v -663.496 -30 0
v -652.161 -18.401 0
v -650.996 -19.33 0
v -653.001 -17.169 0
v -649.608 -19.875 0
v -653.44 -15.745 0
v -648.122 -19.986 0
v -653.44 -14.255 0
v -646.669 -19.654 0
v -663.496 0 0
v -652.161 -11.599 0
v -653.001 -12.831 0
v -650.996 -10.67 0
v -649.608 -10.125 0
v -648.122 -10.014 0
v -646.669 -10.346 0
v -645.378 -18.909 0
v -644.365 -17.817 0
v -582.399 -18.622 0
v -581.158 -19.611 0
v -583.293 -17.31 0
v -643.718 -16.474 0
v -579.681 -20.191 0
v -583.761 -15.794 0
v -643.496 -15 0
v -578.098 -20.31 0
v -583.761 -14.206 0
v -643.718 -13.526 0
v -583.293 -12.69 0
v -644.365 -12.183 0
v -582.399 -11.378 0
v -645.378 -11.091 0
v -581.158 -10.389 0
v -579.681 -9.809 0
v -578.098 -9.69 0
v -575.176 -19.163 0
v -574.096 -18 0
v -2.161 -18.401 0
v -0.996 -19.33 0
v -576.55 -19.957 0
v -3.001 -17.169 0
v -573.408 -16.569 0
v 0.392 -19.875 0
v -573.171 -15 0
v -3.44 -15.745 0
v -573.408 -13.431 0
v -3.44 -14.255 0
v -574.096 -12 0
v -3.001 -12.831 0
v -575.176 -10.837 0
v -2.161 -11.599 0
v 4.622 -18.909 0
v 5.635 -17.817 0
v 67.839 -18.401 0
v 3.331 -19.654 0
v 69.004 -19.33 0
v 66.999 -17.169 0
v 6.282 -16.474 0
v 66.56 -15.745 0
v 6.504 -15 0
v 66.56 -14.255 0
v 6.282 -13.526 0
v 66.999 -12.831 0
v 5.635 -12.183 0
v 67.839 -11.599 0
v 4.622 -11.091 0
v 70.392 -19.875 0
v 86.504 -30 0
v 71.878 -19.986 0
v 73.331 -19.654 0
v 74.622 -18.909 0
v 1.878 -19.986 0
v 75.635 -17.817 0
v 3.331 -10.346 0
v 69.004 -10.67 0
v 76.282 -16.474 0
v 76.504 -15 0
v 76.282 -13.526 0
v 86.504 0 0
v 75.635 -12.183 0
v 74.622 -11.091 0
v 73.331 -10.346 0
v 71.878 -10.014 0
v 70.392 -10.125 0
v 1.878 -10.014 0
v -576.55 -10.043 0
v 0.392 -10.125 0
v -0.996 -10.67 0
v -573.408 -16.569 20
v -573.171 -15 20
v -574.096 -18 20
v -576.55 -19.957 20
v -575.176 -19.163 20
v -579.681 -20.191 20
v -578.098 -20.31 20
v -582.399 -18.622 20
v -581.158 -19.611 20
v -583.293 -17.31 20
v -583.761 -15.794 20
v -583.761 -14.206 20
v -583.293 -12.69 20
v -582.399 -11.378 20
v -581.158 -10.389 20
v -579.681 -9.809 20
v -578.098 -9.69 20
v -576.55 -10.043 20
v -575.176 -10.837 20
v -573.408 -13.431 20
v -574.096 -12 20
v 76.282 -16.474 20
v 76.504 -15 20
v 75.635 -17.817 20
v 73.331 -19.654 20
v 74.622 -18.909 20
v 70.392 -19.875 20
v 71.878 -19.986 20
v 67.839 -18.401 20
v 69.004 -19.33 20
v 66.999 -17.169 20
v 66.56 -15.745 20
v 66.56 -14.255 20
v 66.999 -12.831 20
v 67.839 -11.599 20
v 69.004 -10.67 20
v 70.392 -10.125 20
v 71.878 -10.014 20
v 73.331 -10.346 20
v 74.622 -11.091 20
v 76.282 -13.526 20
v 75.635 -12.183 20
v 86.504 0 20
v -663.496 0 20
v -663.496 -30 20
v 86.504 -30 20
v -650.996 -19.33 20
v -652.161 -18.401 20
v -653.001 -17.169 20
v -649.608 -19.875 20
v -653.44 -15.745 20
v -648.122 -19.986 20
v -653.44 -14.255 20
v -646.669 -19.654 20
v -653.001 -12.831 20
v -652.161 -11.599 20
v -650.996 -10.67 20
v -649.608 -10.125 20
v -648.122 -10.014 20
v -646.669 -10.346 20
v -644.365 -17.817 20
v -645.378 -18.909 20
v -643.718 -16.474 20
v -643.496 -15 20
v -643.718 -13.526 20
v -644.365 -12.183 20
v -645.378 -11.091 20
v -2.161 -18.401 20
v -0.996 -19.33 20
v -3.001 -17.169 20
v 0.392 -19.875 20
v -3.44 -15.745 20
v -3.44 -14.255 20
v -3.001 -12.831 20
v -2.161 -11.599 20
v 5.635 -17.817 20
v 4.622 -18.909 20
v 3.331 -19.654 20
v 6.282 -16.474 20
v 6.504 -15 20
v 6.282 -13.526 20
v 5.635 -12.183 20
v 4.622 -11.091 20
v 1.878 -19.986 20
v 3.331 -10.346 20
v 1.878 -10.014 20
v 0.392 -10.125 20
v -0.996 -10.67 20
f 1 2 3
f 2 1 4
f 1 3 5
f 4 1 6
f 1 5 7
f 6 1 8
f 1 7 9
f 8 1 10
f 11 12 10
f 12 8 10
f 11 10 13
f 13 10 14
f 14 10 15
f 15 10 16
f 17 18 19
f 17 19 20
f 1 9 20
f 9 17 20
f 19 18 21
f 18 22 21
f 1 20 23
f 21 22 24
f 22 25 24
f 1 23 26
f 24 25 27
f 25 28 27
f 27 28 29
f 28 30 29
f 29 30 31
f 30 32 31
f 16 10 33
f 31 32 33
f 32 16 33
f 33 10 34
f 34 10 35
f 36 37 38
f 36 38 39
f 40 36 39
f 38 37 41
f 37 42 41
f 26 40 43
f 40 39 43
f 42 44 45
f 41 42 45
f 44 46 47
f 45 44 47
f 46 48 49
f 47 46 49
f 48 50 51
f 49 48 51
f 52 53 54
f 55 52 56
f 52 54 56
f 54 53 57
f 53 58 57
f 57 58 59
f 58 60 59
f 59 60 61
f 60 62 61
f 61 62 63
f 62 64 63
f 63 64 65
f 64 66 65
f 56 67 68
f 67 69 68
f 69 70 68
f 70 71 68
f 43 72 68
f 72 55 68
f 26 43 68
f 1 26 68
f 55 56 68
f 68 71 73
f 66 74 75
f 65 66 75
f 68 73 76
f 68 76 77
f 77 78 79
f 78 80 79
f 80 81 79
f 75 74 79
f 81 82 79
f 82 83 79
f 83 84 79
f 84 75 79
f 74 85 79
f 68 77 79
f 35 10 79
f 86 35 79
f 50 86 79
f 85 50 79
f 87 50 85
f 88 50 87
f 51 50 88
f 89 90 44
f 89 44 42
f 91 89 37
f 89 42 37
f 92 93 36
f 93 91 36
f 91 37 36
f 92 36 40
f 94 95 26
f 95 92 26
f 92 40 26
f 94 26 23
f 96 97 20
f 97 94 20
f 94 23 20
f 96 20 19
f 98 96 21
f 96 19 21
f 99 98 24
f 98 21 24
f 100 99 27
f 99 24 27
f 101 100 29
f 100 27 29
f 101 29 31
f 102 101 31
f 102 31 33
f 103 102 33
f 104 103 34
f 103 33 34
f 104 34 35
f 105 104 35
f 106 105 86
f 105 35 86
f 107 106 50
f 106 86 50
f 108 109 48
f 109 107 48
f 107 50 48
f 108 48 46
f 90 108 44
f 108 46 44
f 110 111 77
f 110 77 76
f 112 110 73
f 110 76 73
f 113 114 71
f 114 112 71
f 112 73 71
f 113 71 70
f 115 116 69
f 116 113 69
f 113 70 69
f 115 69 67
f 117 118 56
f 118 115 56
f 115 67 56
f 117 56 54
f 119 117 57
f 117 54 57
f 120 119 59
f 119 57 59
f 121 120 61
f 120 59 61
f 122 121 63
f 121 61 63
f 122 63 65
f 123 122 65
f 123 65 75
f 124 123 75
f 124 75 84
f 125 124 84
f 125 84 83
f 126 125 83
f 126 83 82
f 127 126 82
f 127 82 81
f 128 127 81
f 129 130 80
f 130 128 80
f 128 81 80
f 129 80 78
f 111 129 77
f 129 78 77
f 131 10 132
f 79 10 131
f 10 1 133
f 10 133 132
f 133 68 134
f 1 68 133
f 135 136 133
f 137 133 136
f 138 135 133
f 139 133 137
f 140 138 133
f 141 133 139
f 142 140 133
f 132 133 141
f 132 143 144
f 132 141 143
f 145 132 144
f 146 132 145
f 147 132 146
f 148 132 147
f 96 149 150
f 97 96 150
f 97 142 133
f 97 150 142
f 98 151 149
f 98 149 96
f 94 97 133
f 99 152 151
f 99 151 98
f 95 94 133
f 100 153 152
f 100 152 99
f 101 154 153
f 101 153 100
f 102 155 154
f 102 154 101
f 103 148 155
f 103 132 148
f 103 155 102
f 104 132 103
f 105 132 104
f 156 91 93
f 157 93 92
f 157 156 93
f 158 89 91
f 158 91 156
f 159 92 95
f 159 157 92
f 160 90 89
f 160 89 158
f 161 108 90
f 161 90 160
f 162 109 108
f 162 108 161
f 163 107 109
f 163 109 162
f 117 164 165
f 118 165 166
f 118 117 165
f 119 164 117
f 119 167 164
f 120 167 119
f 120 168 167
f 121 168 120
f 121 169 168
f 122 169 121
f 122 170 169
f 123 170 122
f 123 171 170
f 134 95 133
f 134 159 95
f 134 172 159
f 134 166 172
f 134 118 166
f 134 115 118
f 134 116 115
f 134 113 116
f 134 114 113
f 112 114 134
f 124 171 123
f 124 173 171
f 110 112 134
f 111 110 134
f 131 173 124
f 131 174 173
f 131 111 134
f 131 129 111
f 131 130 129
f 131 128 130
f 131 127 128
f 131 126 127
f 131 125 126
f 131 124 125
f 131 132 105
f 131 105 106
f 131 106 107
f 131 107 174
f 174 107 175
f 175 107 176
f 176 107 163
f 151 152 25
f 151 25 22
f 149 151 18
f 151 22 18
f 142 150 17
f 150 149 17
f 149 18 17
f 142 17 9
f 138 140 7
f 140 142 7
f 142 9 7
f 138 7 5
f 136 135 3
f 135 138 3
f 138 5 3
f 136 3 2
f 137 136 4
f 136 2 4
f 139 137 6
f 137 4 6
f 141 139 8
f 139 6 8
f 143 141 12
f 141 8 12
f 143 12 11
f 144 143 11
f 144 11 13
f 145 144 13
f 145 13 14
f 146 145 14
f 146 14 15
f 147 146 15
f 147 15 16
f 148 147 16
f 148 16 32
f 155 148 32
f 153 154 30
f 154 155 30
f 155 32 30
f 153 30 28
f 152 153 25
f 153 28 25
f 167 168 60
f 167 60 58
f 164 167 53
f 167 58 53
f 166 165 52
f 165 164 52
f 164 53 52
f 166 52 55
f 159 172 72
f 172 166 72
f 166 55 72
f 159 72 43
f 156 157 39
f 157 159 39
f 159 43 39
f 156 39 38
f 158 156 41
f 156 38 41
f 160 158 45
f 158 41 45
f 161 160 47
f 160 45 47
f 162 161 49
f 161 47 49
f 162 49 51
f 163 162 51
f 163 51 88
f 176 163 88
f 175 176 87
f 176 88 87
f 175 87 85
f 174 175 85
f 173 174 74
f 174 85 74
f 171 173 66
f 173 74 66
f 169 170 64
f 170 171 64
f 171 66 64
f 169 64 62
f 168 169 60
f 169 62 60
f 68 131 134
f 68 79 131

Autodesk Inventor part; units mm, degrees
ref_plane "YZ Plane" through (0, 0, 0) normal (1, 0, 0) x (0, 1, 0)
ref_plane "XZ Plane" through (0, 0, 0) normal (0, 1, 0) x (-1, 0, 0)
ref_plane "XY Plane" through (0, 0, 0) normal (0, 0, 1) x (1, 0, 0)
sketch "Sketch1" plane through (0, 0, 0) normal (0, 0, 1) x (1, 0, 0)
  line L0 (86.5042, -30) -> (-663.4958, -30)
  line L1 (-663.4958, -30) -> (-663.4958, 0)
  line L2 (-663.4958, 0) -> (86.5042, 0)
  line L3 (86.5042, 0) -> (86.5042, -30)
  circle A0 centre (71.5042, -15) radius 5
  circle A1 centre (1.5042, -15) radius 5
  circle A2 centre (-648.4958, -15) radius 5
  circle A3 centre (-578.4958, -15) radius 5.3247
  point P0 (0, 0)
  dimension "d0" = 30
  dimension "d1" = 750
  dimension "d2" = 10
  dimension "d3" = 15
  dimension "d4" = 15
  dimension "d5" = 15
  dimension "d6" = 10
  dimension "d7" = 70
  dimension "d8" = 15
  dimension "d9" = 10
  dimension "d10" = 15
  dimension "d11" = 15
  dimension "d12" = 70
extrude "Extrusion1" add sketch "Sketch1" along normal blind 20
properties part number "SeatBackSidePlate" material "Wood (Birch)"
